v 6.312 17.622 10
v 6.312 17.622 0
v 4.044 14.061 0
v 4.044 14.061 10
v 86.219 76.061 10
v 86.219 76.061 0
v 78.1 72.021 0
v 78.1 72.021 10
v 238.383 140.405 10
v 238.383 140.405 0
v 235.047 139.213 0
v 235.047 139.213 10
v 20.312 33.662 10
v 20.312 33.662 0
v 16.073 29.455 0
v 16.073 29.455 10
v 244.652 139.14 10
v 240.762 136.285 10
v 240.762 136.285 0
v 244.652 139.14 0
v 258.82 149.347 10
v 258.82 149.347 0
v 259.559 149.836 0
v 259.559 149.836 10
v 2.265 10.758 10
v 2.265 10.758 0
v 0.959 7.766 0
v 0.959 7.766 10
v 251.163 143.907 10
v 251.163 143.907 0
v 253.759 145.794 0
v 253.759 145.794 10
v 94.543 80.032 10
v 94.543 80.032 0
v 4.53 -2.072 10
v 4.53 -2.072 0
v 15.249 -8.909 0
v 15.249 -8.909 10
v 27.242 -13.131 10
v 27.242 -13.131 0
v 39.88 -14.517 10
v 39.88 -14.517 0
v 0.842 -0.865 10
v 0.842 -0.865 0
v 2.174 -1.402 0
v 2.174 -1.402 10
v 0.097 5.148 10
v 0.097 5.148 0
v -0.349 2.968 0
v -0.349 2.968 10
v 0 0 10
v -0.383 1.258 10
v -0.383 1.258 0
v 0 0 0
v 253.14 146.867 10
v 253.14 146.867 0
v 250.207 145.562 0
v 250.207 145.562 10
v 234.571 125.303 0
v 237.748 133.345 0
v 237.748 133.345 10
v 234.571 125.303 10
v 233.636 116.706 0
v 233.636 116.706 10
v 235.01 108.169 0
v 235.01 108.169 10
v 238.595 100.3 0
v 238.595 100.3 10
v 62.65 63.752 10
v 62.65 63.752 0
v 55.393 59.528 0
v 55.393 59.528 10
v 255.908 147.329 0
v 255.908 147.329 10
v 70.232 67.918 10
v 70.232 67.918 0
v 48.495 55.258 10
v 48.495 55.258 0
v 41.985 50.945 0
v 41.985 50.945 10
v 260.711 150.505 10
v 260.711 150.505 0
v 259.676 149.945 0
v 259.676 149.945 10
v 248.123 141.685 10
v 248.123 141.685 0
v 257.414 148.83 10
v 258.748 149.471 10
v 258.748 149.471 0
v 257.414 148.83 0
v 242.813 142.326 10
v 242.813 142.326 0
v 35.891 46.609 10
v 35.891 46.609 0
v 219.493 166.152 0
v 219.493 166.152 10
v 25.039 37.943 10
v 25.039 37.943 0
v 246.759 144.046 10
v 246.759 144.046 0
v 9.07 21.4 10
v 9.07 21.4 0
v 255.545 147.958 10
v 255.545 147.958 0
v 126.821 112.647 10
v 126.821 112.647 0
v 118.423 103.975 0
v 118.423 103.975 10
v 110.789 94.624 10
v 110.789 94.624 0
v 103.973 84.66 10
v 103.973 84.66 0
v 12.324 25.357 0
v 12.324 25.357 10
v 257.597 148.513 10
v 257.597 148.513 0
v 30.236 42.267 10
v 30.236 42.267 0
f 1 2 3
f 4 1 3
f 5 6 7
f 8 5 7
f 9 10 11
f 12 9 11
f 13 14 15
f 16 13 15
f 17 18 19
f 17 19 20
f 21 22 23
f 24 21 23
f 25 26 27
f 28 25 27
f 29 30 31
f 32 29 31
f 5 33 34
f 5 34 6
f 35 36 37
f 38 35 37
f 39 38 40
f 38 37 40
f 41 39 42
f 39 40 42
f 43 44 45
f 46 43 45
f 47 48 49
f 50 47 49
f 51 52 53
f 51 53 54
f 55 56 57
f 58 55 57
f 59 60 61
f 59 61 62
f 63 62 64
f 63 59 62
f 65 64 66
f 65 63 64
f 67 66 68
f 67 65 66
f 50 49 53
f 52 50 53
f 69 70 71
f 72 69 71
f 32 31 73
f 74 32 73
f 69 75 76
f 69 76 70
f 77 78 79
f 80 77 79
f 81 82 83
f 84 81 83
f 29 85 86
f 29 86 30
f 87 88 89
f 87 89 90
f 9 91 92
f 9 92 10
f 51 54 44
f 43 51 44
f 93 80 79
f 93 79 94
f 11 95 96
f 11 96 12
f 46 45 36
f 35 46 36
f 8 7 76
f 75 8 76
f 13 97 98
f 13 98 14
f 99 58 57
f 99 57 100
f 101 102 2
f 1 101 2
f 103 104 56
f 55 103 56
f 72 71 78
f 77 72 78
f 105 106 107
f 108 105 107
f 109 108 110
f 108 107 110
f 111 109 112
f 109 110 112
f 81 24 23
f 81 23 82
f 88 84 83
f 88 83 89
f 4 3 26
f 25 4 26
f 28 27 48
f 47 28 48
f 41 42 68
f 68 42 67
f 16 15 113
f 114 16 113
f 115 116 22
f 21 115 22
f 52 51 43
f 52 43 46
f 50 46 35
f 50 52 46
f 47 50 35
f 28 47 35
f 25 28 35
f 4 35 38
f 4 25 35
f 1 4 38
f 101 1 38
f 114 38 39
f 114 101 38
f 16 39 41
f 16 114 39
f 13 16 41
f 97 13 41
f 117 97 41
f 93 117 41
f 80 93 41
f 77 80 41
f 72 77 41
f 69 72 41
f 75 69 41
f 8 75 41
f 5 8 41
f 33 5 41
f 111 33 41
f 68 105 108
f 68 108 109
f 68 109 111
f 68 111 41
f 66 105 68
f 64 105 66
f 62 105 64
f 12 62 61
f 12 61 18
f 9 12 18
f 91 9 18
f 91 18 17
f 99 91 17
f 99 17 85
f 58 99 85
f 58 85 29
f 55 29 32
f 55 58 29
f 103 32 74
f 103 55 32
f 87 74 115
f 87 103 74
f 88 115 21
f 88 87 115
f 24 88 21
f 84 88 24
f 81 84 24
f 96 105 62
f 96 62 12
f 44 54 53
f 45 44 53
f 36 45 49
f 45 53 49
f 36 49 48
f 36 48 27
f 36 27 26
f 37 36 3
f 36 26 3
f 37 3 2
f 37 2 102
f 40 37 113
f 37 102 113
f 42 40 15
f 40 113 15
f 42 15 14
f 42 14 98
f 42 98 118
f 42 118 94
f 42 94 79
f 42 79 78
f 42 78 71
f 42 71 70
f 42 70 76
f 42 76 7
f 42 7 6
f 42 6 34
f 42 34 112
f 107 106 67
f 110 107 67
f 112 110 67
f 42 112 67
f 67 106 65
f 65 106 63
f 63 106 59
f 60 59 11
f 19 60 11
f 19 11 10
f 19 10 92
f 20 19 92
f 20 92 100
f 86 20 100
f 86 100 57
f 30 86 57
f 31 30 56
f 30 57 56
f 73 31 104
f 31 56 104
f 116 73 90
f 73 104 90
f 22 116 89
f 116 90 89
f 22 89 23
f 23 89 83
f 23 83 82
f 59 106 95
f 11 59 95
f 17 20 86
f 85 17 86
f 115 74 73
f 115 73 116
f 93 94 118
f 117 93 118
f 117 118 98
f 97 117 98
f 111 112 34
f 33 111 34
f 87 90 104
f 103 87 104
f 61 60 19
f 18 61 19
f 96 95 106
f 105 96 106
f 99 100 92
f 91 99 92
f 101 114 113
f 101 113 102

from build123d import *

# Parameters (mm, degrees)
PAD_DEPTH = 10


with BuildPart() as part:
    # Sketch → Pad (new body)
    with BuildSketch(Plane(origin=(0, 0, 0), x_dir=(0.866025, 0.5, 0), z_dir=(0, 0, 1))):
        with BuildLine():
            Line((301.034851, -0.014674), (299.858856, 0.018))
            Line((299.858856, 0.018), (298.818, 0.072))
            Line((298.818, 0.072), (297.342, 0.183))
            Line((297.342, 0.183), (295.287, 0.363))
            Line((295.287, 0.363), (292.659, 0.621))
            Line((292.659, 0.621), (289.467, 0.957))
            Line((289.467, 0.957), (285.723, 1.368))
            Line((285.723, 1.368), (281.445, 1.851))
            Line((281.445, 1.851), (276.648, 2.403))
            Line((276.648, 2.403), (273.162811, 3.038512))
            Line((273.162811, 34.144974), (273.162811, 3.038512))
            Line((273.162811, 34.144974), (166.153931, 34.144974))
            ThreePointArc((166.153931, 34.144974), (148.85588, 28.812612), (132.373183, 21.330808))
            Line((132.373183, 21.330808), (121.893, 22.038))
            Line((121.893, 22.038), (112.698, 22.761))
            Line((112.698, 22.761), (103.647, 23.322))
            Line((103.647, 23.322), (94.782, 23.703))
            Line((94.782, 23.703), (86.133, 23.886))
            Line((86.133, 23.886), (77.736, 23.856))
            Line((77.736, 23.856), (69.627, 23.607))
            Line((69.627, 23.607), (61.833, 23.127))
            Line((61.833, 23.127), (54.387, 22.419))
            Line((54.387, 22.419), (47.319, 21.486))
            Line((47.319, 21.486), (40.656, 20.34))
            Line((40.656, 20.34), (34.422, 18.996))
            Line((34.422, 18.996), (28.647, 17.472))
            Line((28.647, 17.472), (23.352, 15.798))
            Line((23.352, 15.798), (18.555, 13.998))
            Line((18.555, 13.998), (14.277, 12.105))
            Line((14.277, 12.105), (10.533, 10.155))
            Line((10.533, 10.155), (7.341, 8.184))
            Line((7.341, 8.184), (4.713, 6.246))
            Line((4.713, 6.246), (2.658, 4.41))
            Line((2.658, 4.41), (1.182, 2.745))
            Line((1.182, 2.745), (0.297, 1.281))
            Line((0.297, 1.281), (0, 0))
            Line((0, 0), (0.297, -1.17))
            Line((0.297, -1.17), (1.182, -2.301))
            Line((1.182, -2.301), (2.886778, -4.059651))
            ThreePointArc((2.886778, -4.059651), (12.612237, -20.403463), (27.278178, -32.511927))
            Line((27.278178, -32.511927), (256.779602, -32.435658))
            ThreePointArc((272.568004, -3.393518), (260.687772, -15.747631), (256.779602, -32.435658))
            Line((272.568004, -3.393518), (276.648, -2.355))
            Line((276.648, -2.355), (281.445, -1.827))
            Line((281.445, -1.827), (285.723, -1.359))
            Line((285.723, -1.359), (289.467, -0.954))
            Line((289.467, -0.954), (292.659, -0.618))
            Line((292.659, -0.618), (295.287, -0.363))
            Line((295.287, -0.363), (297.342, -0.183))
            Line((297.342, -0.183), (298.818, -0.072))
            Line((298.818, -0.072), (299.703, -0.018))
            Line((299.703, -0.018), (301.034851, -0.014674))
        make_face()
    extrude(amount=PAD_DEPTH)


solid = part.part
